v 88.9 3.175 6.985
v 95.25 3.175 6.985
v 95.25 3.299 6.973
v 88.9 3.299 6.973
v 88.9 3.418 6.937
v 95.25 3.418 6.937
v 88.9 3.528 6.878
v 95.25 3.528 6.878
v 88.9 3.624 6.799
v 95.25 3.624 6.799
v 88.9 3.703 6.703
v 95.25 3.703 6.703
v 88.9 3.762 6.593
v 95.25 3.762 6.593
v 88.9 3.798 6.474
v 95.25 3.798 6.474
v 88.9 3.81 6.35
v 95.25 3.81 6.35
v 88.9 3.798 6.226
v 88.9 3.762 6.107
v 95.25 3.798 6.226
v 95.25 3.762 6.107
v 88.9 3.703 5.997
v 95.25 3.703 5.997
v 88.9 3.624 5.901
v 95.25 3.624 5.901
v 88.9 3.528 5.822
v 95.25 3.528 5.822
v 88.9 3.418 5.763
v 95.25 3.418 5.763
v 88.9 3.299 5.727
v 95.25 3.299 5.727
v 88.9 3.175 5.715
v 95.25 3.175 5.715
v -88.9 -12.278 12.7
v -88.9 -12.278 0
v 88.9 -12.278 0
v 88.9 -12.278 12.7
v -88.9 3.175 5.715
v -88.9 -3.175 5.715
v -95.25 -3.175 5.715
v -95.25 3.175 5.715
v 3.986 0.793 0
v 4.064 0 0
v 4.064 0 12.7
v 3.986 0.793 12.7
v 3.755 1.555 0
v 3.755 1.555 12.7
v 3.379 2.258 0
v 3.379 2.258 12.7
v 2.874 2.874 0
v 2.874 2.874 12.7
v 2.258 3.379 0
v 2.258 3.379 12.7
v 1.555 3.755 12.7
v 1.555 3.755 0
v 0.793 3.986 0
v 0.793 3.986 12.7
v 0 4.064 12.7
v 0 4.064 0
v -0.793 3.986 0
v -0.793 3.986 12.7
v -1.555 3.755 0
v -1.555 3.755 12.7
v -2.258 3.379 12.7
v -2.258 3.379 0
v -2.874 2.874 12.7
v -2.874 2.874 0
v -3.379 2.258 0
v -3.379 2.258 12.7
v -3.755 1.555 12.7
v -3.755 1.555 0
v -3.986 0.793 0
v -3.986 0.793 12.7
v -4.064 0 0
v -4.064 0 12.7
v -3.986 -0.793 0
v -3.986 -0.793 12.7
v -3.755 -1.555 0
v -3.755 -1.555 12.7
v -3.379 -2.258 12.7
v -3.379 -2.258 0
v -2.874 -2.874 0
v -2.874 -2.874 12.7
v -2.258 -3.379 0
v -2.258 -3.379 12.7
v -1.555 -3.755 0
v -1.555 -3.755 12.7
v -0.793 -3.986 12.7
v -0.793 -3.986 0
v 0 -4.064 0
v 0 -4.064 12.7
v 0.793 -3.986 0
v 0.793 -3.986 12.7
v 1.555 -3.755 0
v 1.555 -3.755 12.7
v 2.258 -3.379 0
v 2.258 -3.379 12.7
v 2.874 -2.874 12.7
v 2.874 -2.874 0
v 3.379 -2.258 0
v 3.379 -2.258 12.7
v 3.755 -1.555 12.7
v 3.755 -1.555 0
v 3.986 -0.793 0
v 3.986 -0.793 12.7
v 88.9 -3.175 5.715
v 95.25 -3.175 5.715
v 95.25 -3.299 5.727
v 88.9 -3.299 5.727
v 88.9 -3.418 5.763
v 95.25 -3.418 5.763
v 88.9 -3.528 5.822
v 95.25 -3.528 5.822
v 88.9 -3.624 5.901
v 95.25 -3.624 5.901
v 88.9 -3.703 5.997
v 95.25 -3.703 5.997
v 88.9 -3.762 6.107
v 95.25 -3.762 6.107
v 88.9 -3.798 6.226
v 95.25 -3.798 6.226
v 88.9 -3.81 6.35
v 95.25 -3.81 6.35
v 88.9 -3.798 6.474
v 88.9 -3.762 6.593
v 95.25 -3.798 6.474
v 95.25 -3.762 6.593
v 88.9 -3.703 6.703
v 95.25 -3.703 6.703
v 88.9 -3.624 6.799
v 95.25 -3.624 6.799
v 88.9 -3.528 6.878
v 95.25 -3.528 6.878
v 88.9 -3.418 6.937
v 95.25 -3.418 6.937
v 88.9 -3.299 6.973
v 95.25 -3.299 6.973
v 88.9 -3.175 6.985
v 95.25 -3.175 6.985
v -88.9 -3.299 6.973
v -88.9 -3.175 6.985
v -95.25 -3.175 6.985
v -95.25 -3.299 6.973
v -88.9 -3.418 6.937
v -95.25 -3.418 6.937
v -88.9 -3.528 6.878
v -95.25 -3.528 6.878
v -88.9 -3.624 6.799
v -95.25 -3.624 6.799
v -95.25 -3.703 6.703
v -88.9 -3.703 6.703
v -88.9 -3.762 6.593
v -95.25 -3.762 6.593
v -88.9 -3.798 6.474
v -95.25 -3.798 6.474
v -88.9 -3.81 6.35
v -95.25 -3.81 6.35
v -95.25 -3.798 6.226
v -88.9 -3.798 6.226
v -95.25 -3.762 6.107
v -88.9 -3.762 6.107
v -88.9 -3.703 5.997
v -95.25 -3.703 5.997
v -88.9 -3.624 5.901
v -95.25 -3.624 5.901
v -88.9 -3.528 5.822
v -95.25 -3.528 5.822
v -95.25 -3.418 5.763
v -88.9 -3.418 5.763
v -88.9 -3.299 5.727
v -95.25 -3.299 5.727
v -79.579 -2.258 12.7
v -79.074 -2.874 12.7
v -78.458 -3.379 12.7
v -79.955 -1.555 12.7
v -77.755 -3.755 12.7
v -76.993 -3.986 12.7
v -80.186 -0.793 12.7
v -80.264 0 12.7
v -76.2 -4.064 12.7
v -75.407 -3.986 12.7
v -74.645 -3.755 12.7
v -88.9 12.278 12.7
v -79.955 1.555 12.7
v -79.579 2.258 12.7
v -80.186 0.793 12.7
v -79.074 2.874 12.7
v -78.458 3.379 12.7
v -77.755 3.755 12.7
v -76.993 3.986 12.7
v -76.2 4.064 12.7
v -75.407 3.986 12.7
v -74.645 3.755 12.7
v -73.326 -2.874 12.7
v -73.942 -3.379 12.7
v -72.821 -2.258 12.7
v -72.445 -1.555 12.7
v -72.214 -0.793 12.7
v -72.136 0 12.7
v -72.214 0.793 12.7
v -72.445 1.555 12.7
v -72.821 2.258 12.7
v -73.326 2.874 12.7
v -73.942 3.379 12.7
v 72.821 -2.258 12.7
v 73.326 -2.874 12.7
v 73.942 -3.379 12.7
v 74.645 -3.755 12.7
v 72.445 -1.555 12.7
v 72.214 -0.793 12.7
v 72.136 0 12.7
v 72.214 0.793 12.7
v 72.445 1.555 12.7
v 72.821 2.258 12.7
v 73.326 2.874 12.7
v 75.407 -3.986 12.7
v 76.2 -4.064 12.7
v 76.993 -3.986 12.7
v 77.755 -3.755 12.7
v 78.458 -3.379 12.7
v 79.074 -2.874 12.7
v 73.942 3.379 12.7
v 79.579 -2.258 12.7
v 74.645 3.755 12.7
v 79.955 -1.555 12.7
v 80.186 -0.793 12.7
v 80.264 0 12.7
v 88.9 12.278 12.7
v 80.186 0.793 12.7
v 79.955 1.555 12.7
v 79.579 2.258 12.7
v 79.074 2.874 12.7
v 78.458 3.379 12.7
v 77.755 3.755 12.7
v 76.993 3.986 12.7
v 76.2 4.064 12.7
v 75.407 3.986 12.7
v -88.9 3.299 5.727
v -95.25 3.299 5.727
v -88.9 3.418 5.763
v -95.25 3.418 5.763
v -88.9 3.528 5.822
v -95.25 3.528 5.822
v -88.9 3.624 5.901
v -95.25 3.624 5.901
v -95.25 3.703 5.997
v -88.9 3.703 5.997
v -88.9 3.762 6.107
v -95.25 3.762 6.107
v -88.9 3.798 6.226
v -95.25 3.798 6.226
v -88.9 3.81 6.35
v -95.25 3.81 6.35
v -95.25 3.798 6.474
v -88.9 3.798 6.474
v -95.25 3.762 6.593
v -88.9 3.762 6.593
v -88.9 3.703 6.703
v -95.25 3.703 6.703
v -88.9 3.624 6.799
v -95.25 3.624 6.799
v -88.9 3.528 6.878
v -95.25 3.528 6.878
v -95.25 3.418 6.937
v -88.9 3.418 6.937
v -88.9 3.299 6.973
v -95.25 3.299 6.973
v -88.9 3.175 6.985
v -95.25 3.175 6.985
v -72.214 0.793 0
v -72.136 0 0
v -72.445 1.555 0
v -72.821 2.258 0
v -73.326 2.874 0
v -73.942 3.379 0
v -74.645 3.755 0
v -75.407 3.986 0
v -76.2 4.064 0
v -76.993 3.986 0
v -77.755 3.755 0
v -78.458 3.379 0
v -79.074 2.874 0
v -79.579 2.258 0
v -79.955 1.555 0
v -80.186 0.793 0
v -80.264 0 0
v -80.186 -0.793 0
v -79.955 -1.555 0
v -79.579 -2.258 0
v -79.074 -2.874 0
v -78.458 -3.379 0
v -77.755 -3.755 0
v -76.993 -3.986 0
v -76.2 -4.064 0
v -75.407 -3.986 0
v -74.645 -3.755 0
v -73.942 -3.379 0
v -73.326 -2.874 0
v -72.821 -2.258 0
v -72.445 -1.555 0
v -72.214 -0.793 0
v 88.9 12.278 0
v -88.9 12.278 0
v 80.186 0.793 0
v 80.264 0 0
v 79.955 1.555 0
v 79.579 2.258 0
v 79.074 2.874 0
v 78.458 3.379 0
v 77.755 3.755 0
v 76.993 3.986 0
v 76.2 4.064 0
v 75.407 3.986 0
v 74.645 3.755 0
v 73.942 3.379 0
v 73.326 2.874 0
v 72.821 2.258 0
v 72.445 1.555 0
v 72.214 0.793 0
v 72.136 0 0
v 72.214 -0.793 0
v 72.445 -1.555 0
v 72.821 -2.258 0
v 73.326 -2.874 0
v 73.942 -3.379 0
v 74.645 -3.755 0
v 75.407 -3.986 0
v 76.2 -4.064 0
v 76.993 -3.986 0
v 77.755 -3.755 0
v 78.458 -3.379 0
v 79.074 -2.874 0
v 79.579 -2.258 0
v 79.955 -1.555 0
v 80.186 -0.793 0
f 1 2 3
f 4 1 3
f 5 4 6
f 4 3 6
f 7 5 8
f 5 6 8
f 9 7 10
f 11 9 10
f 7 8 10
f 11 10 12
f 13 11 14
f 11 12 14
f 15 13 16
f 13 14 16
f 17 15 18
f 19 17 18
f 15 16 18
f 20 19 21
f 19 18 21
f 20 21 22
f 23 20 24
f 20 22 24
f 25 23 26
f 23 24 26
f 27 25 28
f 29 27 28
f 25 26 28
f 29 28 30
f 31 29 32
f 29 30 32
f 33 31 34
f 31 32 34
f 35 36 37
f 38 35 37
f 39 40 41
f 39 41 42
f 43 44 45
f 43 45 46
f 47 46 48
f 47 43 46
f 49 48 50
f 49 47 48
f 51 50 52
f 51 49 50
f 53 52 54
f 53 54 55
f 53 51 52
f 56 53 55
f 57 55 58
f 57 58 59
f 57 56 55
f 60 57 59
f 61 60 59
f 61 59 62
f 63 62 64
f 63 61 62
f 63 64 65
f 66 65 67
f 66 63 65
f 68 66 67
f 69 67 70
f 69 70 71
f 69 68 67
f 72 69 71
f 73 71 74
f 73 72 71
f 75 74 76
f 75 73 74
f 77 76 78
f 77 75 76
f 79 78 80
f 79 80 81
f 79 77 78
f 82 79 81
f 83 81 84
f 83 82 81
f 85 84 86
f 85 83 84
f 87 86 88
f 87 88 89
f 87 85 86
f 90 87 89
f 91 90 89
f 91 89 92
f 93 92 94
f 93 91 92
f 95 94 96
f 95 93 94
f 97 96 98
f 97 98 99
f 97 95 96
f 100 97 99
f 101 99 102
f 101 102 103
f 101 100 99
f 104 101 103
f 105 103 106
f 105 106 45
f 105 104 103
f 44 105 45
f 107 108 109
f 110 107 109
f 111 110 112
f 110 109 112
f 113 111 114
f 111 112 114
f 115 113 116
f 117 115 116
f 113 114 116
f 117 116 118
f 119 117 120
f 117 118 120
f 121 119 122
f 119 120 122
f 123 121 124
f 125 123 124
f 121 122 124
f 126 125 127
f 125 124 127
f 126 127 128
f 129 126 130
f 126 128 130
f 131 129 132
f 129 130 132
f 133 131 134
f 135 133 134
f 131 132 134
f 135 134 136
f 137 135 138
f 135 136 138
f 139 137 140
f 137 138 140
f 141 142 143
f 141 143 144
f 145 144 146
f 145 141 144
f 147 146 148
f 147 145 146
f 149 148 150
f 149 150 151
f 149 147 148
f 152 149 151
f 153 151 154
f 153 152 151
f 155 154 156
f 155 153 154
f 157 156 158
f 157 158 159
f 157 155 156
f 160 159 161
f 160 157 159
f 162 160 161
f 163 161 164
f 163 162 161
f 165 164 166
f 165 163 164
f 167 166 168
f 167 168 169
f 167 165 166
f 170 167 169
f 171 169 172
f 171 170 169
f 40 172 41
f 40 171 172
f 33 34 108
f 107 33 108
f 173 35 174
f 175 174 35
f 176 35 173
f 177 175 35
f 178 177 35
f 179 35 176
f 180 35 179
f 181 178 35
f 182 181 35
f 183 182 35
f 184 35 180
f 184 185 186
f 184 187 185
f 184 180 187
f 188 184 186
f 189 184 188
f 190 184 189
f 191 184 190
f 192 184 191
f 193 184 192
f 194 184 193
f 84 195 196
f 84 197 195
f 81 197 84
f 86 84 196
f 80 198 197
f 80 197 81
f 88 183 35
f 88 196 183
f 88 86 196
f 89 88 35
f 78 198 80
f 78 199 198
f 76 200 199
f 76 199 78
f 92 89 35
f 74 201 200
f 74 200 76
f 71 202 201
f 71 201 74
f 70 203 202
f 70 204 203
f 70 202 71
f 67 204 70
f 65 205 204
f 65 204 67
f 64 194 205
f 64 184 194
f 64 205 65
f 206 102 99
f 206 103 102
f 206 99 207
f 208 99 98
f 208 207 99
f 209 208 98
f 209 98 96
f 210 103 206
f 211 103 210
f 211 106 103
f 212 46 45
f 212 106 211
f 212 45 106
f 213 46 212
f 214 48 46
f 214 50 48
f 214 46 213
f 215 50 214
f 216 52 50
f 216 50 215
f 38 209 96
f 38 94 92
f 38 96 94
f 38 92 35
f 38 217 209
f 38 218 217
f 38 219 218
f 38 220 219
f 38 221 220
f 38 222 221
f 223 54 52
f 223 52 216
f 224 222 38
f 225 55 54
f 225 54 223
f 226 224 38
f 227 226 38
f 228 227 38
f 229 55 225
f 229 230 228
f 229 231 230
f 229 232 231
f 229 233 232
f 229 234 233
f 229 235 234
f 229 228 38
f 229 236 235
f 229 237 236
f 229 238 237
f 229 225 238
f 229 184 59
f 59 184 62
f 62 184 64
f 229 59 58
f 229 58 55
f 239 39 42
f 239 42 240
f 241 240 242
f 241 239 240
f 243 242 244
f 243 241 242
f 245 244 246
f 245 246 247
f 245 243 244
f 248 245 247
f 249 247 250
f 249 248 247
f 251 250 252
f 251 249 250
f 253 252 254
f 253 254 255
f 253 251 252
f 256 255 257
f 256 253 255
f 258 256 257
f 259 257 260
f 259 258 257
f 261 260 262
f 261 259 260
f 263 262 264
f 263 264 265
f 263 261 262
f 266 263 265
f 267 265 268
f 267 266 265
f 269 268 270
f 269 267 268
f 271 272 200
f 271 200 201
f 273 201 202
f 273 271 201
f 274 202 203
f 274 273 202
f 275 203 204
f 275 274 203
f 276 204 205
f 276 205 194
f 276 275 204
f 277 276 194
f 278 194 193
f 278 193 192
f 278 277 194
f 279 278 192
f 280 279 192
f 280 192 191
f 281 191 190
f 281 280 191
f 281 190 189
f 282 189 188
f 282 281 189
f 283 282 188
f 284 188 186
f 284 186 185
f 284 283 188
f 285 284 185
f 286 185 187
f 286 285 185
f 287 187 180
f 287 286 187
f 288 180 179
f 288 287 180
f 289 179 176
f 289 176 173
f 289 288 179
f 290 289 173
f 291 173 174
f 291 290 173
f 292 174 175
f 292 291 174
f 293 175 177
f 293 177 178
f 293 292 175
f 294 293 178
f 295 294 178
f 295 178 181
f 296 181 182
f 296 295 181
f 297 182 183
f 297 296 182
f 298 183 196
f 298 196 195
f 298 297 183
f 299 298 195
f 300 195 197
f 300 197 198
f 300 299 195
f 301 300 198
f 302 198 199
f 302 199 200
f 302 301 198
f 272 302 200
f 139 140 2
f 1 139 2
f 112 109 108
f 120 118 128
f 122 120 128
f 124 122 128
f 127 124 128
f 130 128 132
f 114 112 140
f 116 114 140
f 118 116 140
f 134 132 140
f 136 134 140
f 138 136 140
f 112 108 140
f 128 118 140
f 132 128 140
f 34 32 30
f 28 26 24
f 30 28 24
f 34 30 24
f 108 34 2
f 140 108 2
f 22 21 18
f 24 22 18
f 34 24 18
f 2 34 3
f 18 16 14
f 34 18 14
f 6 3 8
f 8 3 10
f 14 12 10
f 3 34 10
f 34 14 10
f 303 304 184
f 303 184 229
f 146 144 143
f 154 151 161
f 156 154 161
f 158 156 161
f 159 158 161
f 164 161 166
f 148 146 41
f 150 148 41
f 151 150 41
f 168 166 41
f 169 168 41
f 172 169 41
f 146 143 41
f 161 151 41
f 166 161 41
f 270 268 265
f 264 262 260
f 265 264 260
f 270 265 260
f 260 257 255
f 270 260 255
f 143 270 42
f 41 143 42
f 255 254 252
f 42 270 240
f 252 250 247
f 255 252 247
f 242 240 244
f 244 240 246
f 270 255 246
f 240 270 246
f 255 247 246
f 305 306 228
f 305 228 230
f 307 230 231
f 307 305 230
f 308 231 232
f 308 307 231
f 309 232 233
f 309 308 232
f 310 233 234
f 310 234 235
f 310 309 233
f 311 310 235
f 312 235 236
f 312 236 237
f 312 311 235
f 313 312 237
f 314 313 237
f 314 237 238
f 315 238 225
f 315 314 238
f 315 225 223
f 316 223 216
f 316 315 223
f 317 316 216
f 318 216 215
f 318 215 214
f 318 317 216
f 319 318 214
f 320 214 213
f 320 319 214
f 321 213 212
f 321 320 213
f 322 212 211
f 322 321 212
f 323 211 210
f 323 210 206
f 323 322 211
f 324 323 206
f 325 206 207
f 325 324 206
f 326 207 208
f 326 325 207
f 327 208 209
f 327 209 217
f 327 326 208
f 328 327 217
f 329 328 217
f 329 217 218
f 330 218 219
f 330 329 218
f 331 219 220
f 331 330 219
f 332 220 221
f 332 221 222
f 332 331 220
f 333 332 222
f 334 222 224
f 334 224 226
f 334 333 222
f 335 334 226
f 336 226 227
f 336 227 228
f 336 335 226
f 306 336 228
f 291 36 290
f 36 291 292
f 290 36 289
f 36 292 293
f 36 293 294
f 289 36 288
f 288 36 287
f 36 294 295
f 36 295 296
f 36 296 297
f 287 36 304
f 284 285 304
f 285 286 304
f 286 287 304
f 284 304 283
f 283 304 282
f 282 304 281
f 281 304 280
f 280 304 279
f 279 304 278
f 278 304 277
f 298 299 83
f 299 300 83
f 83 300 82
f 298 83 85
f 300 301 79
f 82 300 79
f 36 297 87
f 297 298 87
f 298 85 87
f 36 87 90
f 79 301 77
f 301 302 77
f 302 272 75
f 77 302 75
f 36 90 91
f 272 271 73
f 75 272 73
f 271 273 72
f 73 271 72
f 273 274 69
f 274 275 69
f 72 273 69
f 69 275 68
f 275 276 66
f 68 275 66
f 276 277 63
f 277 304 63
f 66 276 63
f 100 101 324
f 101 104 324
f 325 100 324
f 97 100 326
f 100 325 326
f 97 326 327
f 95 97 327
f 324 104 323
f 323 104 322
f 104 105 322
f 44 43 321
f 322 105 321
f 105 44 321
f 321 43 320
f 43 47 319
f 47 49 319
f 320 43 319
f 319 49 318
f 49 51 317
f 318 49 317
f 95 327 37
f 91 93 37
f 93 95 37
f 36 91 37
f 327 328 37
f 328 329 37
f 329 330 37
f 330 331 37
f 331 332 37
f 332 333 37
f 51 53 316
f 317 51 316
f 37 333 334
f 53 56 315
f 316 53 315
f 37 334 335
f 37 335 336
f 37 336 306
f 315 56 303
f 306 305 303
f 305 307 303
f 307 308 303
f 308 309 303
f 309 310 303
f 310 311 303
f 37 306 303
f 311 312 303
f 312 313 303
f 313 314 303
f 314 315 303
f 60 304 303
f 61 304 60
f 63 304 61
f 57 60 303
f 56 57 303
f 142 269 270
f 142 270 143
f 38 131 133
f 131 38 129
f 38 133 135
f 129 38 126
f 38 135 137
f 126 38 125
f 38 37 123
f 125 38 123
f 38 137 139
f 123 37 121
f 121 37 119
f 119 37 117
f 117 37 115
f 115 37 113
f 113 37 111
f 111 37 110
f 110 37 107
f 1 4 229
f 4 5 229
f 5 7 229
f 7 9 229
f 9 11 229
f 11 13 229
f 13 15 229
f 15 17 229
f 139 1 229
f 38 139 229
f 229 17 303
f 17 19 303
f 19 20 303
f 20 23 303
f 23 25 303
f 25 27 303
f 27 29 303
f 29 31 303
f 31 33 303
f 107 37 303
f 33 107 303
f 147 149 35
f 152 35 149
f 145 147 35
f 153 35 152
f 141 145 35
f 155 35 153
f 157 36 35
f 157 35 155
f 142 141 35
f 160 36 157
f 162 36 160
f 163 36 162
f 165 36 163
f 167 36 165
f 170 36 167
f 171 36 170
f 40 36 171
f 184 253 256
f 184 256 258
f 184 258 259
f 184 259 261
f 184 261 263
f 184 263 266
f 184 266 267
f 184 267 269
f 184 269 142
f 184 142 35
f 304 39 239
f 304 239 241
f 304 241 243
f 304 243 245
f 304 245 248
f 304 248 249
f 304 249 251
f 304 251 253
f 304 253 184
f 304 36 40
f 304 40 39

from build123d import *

# Parameters (mm, degrees)
SKETCH1_W           = 177.8
SKETCH1_H           = 24.555331286
SKETCH1_R           = 4.064
BOSS_EXTRUDE1_DEPTH = 12.7
BOSS_EXTRUDE2_DEPTH = 6.35
BOSS_EXTRUDE3_START = 6.35
BOSS_EXTRUDE3_DEPTH = 6.35


with BuildPart() as part:
    # Sketch1 → Boss-Extrude1 (new body)
    with BuildSketch(Plane.XY):
        Rectangle(SKETCH1_W, SKETCH1_H)
        Circle(SKETCH1_R, mode=Mode.SUBTRACT)
        with Locations((-76.2, 0)):
            Circle(SKETCH1_R, mode=Mode.SUBTRACT)
        with Locations((76.2, 0)):
            Circle(SKETCH1_R, mode=Mode.SUBTRACT)
    extrude(amount=BOSS_EXTRUDE1_DEPTH)

    # Sketch2 → Boss-Extrude2 (add)
    with BuildSketch(Plane.ZY.offset(88.9)):
        with BuildLine():
            Line((5.715, -3.175), (5.715, 3.175))
            ThreePointArc((5.715, 3.175), (6.35, 3.81), (6.985, 3.175))
            Line((6.985, 3.175), (6.985, -3.175))
            ThreePointArc((6.985, -3.175), (6.35, -3.81), (5.715, -3.175))
        make_face()
    extrude(amount=BOSS_EXTRUDE2_DEPTH)

    # Sketch3 → Boss-Extrude3 (add)
    with BuildSketch(Plane(origin=(88.9, 0, 0), x_dir=(0, 0, -1), z_dir=(1, 0, 0)).offset(BOSS_EXTRUDE3_START)):
        with BuildLine():
            Line((-5.715, 3.175), (-5.715, -3.175))
            ThreePointArc((-5.715, -3.175), (-6.35, -3.81), (-6.985, -3.175))
            Line((-6.985, -3.175), (-6.985, 3.175))
            ThreePointArc((-6.985, 3.175), (-6.35, 3.81), (-5.715, 3.175))
        make_face()
    extrude(amount=-BOSS_EXTRUDE3_DEPTH)


solid = part.part
